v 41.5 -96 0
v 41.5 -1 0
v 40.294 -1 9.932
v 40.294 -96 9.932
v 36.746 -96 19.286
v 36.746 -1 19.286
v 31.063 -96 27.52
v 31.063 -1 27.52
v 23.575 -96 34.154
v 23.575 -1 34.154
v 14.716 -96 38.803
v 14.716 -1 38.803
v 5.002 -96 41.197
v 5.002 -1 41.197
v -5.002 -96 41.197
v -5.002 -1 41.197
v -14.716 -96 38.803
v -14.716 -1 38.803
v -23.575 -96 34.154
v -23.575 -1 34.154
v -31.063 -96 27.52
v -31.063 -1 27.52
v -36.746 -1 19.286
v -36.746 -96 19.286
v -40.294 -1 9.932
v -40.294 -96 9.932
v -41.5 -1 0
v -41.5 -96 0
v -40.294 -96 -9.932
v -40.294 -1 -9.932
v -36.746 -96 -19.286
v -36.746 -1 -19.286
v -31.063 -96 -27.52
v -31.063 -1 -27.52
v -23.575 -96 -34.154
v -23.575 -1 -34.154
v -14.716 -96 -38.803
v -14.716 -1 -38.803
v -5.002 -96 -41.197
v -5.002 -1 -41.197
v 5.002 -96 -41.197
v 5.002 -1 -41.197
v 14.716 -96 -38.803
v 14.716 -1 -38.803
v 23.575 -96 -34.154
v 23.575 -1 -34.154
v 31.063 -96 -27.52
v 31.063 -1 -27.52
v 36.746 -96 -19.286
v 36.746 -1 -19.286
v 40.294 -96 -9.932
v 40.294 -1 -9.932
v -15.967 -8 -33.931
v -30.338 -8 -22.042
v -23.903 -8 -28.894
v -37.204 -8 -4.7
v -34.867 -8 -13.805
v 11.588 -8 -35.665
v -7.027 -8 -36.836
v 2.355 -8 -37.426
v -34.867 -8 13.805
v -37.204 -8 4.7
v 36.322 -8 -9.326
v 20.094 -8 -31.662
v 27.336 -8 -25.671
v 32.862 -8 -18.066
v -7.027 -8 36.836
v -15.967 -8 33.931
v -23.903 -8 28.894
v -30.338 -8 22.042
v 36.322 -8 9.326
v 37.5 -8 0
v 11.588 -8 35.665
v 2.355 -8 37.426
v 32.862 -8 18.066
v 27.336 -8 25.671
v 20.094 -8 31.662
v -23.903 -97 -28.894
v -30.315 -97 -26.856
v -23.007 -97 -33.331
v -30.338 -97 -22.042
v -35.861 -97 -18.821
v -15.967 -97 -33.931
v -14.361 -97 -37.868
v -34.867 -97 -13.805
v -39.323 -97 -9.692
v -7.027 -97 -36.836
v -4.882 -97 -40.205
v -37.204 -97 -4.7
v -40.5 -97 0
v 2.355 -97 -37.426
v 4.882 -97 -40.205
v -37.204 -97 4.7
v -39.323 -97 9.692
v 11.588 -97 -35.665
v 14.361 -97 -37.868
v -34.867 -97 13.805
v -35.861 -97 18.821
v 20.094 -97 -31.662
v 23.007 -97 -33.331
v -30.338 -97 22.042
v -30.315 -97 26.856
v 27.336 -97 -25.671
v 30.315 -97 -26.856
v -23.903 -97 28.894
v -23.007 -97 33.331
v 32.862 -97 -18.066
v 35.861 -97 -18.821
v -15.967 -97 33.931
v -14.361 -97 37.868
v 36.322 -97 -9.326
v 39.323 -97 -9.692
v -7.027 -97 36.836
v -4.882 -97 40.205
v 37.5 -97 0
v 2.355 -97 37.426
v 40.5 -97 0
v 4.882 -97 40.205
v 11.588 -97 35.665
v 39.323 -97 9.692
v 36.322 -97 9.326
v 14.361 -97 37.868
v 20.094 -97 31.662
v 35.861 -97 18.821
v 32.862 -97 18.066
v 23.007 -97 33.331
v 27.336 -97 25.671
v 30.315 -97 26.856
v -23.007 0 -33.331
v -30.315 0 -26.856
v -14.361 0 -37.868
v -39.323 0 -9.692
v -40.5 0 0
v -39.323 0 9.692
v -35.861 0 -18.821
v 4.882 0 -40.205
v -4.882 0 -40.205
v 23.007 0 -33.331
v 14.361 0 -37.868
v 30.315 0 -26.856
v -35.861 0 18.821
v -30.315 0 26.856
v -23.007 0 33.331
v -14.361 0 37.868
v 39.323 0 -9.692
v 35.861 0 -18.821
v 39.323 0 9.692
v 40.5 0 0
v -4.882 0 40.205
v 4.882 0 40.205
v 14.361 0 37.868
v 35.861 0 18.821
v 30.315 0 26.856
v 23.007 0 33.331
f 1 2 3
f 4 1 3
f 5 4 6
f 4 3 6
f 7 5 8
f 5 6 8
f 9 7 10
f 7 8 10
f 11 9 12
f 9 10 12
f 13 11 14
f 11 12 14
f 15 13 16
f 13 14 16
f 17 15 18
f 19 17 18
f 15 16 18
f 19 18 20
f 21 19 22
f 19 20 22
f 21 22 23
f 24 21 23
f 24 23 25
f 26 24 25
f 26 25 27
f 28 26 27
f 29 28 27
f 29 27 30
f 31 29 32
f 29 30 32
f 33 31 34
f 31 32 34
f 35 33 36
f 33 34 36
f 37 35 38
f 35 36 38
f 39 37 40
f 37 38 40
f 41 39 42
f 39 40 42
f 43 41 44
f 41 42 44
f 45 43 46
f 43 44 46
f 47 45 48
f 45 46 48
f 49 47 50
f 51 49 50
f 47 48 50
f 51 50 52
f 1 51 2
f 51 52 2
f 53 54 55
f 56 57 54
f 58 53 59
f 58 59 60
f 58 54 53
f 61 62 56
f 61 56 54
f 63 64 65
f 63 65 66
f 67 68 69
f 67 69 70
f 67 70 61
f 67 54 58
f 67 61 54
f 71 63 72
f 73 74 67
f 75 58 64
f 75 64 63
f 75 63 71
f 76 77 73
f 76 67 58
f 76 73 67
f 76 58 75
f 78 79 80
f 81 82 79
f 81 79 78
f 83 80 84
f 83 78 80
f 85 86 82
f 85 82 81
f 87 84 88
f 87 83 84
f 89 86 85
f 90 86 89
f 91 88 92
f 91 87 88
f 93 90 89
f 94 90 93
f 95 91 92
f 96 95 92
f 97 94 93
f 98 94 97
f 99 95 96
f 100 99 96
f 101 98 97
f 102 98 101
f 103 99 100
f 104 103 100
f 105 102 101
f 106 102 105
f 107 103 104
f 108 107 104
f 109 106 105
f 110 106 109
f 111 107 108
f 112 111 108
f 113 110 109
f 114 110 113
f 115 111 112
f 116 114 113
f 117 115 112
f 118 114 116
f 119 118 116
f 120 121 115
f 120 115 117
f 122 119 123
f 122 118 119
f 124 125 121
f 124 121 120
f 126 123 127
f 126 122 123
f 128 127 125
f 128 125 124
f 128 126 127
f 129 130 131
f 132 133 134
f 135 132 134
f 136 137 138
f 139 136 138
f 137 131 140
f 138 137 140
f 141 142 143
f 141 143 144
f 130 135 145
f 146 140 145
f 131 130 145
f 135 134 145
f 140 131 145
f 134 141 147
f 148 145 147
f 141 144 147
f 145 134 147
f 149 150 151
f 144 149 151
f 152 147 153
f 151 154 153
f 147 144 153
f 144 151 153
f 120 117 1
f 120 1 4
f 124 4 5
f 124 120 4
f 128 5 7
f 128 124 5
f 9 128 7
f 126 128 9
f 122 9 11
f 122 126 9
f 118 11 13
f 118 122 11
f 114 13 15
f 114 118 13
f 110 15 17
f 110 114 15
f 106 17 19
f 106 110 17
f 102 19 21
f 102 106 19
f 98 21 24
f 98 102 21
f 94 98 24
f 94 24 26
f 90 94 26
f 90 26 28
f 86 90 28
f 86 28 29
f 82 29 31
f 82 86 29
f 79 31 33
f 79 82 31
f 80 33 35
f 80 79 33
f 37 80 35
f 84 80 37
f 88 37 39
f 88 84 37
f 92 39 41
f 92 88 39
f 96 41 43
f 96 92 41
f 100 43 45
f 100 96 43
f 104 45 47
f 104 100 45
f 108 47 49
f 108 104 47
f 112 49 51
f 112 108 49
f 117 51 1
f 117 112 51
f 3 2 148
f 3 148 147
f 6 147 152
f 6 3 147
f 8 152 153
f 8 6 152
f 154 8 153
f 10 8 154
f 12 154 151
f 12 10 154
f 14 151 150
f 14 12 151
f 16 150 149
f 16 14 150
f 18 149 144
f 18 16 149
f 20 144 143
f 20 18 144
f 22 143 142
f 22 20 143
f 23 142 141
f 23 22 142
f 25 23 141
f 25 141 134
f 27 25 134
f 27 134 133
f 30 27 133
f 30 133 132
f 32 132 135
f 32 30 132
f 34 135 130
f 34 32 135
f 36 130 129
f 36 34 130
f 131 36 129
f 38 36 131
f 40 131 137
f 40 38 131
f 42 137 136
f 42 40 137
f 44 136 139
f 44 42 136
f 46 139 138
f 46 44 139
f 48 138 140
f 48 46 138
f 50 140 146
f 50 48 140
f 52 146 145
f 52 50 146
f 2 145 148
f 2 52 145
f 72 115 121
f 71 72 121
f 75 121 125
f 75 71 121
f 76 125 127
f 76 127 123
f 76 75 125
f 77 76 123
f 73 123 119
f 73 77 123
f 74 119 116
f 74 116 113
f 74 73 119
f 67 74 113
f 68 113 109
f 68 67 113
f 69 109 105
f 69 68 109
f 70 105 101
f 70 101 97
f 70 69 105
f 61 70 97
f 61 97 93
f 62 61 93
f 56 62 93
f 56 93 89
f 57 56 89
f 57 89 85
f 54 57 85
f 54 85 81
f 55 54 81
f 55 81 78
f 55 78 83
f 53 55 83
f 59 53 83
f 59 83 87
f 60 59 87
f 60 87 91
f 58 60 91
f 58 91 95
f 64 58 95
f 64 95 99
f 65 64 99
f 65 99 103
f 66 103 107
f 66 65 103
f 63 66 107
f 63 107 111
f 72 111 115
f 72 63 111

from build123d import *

# Parameters (mm, degrees)
F0_R     = 41.5
F0_R_2   = 37.5
F1_DEPTH = 97
F2_DEPTH = 8
F3_SIZE  = 1


with BuildPart() as f1:
    # F0 (on Front) → F1 (new body)
    with BuildSketch(Plane.XZ):
        Circle(F0_R)
        Circle(F0_R_2, mode=Mode.SUBTRACT)
    extrude(amount=F1_DEPTH)

    # F0 (on Front) → F2 (join)
    with BuildSketch(Plane.XZ):
        Circle(F0_R_2)
    extrude(amount=F2_DEPTH)

    # F3
    f3_edges = [f1.edges().sort_by_distance(p)[0] for p in [
        (41.5, -48.5, 0),
        (-41.5, 0, 0),
        (-41.5, -97, 0),
    ]]
    chamfer(f3_edges, length=F3_SIZE)


solid = f1.part
